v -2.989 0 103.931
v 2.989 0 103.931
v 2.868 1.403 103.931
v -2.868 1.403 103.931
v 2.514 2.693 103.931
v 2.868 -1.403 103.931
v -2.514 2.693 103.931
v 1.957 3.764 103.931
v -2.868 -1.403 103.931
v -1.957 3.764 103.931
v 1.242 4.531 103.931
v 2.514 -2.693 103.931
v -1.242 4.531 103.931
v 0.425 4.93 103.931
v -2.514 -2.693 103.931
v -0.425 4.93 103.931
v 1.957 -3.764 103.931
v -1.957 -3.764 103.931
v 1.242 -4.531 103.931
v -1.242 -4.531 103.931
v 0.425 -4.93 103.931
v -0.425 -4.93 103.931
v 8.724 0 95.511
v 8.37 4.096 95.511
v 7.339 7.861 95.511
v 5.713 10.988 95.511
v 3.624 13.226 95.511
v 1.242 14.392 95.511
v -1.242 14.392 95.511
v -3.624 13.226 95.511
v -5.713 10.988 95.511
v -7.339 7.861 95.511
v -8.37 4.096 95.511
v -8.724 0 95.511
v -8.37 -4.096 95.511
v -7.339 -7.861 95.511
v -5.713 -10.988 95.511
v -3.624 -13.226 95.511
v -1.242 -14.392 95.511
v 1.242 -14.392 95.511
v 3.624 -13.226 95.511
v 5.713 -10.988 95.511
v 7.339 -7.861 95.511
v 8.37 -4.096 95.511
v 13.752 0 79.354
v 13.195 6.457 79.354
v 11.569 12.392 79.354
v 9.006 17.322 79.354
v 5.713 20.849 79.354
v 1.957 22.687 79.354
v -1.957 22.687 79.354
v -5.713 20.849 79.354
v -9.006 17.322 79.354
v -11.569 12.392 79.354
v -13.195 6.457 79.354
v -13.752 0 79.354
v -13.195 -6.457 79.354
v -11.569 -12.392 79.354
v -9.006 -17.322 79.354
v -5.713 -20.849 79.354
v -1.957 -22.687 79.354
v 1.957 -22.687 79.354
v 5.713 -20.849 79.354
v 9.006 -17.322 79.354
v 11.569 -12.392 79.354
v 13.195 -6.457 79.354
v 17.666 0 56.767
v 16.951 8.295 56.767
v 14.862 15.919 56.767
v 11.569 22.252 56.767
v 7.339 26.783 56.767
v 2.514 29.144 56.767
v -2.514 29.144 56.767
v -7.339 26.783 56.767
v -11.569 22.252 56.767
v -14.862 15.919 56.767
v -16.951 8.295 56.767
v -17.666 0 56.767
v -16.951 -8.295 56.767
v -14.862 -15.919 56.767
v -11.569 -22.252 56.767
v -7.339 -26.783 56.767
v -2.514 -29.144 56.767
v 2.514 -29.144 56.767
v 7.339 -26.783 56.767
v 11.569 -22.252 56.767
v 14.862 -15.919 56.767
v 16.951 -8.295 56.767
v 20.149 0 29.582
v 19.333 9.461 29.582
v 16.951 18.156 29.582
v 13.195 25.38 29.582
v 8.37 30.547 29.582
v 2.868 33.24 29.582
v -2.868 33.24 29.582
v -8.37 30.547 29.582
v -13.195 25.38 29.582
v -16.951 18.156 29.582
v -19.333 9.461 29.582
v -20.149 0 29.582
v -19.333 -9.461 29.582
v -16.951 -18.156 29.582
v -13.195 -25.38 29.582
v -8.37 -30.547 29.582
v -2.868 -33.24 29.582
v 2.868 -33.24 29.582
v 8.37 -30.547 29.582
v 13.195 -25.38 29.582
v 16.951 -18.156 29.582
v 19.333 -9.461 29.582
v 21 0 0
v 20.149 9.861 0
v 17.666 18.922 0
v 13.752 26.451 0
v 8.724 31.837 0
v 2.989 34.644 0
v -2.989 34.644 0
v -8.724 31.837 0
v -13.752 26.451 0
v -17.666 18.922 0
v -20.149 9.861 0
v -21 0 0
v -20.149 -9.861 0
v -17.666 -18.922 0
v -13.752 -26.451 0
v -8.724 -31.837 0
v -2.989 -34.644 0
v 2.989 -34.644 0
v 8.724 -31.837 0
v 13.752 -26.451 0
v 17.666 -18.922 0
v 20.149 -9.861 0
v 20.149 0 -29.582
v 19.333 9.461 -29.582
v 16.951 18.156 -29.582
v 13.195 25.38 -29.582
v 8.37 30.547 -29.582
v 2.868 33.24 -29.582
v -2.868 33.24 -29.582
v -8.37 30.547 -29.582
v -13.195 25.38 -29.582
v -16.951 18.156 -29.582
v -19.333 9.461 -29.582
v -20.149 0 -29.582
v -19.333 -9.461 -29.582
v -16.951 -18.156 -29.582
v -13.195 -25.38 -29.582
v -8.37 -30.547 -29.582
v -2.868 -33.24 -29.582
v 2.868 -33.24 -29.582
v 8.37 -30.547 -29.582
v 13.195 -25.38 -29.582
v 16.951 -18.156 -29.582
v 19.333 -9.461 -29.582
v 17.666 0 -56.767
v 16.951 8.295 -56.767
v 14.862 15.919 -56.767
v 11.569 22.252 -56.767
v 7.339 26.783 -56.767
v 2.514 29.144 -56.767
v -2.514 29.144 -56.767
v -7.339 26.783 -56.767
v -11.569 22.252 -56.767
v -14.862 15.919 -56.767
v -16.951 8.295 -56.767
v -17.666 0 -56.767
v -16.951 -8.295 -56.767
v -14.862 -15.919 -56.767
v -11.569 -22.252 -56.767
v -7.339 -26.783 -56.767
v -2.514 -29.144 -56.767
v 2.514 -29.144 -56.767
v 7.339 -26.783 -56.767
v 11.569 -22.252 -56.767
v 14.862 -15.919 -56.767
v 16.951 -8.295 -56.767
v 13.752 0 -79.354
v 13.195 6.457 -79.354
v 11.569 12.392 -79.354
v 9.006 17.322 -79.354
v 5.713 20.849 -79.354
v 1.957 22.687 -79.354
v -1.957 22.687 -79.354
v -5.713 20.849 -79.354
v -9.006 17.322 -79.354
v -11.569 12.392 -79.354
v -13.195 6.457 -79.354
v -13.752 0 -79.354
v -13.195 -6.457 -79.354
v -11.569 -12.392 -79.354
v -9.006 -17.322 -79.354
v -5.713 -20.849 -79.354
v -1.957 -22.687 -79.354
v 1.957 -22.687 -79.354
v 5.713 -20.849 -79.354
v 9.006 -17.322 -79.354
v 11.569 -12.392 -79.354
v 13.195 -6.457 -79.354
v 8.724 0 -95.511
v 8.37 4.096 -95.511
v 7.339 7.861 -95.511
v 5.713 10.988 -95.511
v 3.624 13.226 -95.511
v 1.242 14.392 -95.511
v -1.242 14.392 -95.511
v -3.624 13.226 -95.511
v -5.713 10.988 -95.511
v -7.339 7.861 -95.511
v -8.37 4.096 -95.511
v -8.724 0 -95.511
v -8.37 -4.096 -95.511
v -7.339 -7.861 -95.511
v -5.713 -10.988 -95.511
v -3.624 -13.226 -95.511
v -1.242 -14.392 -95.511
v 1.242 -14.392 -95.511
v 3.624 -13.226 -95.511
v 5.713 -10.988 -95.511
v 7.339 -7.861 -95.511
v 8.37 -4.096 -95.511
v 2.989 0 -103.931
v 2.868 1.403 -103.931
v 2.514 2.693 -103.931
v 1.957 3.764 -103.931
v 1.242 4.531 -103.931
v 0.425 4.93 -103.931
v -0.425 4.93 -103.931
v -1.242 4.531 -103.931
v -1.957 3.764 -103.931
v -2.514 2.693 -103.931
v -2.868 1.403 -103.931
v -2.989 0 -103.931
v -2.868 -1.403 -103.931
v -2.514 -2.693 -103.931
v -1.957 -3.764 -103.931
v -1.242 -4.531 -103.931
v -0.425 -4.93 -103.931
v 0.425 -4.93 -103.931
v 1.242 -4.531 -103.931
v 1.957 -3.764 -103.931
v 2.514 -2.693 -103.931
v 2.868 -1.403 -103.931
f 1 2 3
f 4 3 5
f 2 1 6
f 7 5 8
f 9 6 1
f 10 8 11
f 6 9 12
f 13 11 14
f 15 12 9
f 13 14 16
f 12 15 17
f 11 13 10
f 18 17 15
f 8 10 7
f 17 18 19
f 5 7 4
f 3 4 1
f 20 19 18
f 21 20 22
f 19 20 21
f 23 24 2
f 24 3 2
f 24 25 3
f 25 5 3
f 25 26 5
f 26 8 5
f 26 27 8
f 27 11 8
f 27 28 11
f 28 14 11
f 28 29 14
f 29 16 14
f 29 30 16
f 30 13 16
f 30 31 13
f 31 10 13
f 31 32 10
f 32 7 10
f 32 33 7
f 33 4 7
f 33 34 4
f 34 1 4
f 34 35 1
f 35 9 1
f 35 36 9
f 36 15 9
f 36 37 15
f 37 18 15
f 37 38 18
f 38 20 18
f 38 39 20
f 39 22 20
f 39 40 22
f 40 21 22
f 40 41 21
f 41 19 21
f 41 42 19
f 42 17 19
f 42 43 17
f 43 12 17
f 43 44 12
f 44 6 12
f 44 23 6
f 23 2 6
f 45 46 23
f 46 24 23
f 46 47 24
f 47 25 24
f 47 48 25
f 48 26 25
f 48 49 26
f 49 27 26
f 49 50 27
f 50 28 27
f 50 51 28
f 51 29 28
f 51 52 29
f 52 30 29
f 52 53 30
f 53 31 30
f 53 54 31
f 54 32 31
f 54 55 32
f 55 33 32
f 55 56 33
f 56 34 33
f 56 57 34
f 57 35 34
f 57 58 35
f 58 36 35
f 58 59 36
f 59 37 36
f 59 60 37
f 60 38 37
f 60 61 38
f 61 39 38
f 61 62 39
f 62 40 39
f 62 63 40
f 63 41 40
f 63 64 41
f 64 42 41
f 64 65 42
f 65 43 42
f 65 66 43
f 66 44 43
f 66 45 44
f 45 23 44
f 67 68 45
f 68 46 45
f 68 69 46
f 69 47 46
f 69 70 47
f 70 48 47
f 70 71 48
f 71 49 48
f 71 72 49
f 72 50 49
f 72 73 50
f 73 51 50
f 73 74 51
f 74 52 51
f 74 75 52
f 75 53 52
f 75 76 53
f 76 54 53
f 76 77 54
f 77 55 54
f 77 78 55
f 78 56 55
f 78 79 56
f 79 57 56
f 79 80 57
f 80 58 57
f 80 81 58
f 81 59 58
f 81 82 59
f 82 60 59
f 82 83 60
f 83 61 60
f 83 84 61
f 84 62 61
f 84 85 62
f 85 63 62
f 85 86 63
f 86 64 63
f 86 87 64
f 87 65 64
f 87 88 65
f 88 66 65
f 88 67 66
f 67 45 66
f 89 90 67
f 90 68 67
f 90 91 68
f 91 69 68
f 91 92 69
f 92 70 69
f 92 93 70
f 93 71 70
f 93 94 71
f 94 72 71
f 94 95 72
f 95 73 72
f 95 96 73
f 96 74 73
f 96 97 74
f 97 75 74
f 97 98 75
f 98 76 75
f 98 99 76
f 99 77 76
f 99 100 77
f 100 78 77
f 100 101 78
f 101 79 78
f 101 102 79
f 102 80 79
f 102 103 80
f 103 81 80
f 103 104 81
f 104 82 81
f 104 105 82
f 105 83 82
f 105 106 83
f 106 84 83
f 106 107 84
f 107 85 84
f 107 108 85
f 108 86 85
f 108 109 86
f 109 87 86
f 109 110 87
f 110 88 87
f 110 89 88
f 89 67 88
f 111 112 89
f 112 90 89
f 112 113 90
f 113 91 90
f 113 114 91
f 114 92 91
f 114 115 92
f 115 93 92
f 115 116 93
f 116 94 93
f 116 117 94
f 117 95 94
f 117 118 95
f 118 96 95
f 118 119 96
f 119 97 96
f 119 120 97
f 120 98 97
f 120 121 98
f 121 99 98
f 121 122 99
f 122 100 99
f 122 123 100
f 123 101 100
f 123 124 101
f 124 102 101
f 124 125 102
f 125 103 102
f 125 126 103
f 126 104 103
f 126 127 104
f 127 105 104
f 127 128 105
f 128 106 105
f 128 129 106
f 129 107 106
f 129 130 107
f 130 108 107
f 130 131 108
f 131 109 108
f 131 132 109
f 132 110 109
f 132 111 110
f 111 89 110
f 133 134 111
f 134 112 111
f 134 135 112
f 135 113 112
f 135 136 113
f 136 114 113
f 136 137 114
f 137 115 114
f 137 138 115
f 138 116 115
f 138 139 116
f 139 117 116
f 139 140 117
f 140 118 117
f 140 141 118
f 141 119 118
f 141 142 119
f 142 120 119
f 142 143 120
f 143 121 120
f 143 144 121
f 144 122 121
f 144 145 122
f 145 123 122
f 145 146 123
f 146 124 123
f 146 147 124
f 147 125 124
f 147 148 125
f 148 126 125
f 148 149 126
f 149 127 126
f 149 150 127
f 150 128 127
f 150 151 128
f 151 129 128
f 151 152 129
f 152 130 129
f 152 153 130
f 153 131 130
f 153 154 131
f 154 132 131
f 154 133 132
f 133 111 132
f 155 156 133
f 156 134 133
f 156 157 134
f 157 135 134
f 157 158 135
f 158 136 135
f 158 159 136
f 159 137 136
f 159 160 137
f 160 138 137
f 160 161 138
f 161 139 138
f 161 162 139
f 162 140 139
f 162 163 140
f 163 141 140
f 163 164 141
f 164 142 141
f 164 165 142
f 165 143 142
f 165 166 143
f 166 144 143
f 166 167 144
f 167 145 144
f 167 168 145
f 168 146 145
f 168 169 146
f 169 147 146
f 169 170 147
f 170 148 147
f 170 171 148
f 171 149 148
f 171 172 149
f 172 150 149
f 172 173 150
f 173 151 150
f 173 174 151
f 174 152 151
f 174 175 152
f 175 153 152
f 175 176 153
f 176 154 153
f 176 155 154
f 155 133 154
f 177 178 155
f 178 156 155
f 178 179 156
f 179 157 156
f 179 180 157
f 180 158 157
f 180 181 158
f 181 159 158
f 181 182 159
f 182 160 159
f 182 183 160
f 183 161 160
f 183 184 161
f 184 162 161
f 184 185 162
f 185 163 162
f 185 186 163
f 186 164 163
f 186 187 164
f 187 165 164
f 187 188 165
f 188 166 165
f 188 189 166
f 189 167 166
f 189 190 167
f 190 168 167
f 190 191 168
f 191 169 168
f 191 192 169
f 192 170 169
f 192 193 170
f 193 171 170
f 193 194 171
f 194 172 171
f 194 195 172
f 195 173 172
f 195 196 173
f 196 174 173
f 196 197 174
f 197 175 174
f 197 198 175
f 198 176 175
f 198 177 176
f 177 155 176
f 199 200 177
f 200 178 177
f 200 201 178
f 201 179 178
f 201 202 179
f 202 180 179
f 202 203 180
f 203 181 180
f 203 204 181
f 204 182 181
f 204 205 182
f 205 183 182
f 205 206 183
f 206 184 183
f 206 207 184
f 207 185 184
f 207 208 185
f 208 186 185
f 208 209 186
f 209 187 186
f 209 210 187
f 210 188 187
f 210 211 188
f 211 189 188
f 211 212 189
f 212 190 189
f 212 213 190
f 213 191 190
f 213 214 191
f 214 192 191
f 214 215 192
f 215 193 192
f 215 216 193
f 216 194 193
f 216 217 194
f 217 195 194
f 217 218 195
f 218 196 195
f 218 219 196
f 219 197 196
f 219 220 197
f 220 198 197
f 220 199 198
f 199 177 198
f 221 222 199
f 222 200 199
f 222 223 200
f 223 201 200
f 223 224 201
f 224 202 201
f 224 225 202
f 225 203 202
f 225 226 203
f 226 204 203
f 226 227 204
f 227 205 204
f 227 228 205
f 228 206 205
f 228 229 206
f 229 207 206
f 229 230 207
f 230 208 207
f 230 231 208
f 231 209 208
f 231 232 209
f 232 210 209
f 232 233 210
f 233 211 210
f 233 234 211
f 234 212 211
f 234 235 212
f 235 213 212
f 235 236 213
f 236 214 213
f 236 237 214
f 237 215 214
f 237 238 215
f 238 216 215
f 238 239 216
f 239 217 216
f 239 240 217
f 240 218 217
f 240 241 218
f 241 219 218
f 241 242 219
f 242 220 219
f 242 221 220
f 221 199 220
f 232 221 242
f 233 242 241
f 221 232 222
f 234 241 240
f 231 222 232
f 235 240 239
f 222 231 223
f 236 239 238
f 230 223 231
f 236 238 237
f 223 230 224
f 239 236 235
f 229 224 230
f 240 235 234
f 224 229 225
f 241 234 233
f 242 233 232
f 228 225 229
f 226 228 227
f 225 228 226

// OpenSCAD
// Generated by SolidPython 1.0.1 on 2020-07-29 00:46:45


scale(v = [3, 5, 15]) {
	sphere(r = 7);
}
/***********************************************
*********      SolidPython code:      **********
************************************************
 
# import packages: SolidPython
from solid import *
from solid.utils import *
from itertools import chain, combinations, permutations


class Resize:

    def __init__(self, scad_file):
        self.scad_file = scad_file
        #self.scad_file = import_scad(scad_file)
        # cone/cylinder param:
        self.r1 = 0
        self.r2 = 0
        self.h = 0
        # rectangular prism param:
        self.w = 0
        self.l = 0
        # ellipse param:
        self.r = 0

    # import OpenScad code (file name corresponds to shape)


    # classify shape + parameters
    def assign(self, param1, param2, param3):
        if self.scad_file == 'cone.scad':
            self.r1 = param1
            self.r2 = param2
            self.h = param3
        elif self.scad_file == 'cylinder.scad':
            self.r1 = param1
            self.r2 = param2
            self.h = param3
        elif self.scad_file == 'rectangularPrism.scad':
            self.h = param1
            self.l = param2
            self.w = param3
        else:
            self.r = param1
            self.h = param2

    # resize parameters
    def iterate(self):
        x = range(3, 20, 2)
        i = 1
        if self.scad_file == 'cone.scad':
            tempList = list(permutations(x, 2))
            for temp in tempList:
                param1 = temp[0]
                param2 = temp[1]
                filepath = 'produced_scad_files/' + 'cone' + str(param1) + '_' + str(param2) + '_' + '.scad'
                scad_render_to_file(cylinder(h=param1, r1=param2, r2=0), filepath)

        elif self.scad_file == 'cylinder.scad':
            tempList = list(permutations(x, 3))
            for temp in tempList:
                param1 = temp[0]
                param2 = temp[1]
                filepath = 'produced_scad_files/' + 'cylinder' + str(param1) + '_' + str(param2) + '_' + '.scad'
                scad_render_to_file(cylinder(h=param1, r1=param2, r2=param2), filepath)

        elif self.scad_file == 'rectangularPrism.scad':
            tempList = list(permutations(x, 3))
            for temp in tempList:
                param1 = temp[0]
                param2 = temp[1]
                param3 = temp[2]
                filepath = 'produced_scad_files/' + 'rectangularPrism' + str(param1) + '_' + str(param2) + '_' + str(
                    param3) + '.scad'
                scad_render_to_file(cube(size=(param1, param2, param3)), filepath)

        elif self.scad_file == 'ellipse.scad':
            tempList = list(permutations(x, 4))
            for temp in tempList:
                param1 = temp[0]
                param2 = temp[1]
                param3 = temp[2]
                param4 = temp[3]
                filepath = 'produced_scad_files/' + 'ellipse' + str(param1) + '_' + str(param2) + '_' + str(param3) + '_' + str(param4) + '.scad'
                scad_render_to_file(scale([param1, param2, param3])(sphere(r=param4)), filepath)

    def render_to_scadfile(self):
        scad_render_to_file(scad, 'example.scad') 
 
************************************************/
